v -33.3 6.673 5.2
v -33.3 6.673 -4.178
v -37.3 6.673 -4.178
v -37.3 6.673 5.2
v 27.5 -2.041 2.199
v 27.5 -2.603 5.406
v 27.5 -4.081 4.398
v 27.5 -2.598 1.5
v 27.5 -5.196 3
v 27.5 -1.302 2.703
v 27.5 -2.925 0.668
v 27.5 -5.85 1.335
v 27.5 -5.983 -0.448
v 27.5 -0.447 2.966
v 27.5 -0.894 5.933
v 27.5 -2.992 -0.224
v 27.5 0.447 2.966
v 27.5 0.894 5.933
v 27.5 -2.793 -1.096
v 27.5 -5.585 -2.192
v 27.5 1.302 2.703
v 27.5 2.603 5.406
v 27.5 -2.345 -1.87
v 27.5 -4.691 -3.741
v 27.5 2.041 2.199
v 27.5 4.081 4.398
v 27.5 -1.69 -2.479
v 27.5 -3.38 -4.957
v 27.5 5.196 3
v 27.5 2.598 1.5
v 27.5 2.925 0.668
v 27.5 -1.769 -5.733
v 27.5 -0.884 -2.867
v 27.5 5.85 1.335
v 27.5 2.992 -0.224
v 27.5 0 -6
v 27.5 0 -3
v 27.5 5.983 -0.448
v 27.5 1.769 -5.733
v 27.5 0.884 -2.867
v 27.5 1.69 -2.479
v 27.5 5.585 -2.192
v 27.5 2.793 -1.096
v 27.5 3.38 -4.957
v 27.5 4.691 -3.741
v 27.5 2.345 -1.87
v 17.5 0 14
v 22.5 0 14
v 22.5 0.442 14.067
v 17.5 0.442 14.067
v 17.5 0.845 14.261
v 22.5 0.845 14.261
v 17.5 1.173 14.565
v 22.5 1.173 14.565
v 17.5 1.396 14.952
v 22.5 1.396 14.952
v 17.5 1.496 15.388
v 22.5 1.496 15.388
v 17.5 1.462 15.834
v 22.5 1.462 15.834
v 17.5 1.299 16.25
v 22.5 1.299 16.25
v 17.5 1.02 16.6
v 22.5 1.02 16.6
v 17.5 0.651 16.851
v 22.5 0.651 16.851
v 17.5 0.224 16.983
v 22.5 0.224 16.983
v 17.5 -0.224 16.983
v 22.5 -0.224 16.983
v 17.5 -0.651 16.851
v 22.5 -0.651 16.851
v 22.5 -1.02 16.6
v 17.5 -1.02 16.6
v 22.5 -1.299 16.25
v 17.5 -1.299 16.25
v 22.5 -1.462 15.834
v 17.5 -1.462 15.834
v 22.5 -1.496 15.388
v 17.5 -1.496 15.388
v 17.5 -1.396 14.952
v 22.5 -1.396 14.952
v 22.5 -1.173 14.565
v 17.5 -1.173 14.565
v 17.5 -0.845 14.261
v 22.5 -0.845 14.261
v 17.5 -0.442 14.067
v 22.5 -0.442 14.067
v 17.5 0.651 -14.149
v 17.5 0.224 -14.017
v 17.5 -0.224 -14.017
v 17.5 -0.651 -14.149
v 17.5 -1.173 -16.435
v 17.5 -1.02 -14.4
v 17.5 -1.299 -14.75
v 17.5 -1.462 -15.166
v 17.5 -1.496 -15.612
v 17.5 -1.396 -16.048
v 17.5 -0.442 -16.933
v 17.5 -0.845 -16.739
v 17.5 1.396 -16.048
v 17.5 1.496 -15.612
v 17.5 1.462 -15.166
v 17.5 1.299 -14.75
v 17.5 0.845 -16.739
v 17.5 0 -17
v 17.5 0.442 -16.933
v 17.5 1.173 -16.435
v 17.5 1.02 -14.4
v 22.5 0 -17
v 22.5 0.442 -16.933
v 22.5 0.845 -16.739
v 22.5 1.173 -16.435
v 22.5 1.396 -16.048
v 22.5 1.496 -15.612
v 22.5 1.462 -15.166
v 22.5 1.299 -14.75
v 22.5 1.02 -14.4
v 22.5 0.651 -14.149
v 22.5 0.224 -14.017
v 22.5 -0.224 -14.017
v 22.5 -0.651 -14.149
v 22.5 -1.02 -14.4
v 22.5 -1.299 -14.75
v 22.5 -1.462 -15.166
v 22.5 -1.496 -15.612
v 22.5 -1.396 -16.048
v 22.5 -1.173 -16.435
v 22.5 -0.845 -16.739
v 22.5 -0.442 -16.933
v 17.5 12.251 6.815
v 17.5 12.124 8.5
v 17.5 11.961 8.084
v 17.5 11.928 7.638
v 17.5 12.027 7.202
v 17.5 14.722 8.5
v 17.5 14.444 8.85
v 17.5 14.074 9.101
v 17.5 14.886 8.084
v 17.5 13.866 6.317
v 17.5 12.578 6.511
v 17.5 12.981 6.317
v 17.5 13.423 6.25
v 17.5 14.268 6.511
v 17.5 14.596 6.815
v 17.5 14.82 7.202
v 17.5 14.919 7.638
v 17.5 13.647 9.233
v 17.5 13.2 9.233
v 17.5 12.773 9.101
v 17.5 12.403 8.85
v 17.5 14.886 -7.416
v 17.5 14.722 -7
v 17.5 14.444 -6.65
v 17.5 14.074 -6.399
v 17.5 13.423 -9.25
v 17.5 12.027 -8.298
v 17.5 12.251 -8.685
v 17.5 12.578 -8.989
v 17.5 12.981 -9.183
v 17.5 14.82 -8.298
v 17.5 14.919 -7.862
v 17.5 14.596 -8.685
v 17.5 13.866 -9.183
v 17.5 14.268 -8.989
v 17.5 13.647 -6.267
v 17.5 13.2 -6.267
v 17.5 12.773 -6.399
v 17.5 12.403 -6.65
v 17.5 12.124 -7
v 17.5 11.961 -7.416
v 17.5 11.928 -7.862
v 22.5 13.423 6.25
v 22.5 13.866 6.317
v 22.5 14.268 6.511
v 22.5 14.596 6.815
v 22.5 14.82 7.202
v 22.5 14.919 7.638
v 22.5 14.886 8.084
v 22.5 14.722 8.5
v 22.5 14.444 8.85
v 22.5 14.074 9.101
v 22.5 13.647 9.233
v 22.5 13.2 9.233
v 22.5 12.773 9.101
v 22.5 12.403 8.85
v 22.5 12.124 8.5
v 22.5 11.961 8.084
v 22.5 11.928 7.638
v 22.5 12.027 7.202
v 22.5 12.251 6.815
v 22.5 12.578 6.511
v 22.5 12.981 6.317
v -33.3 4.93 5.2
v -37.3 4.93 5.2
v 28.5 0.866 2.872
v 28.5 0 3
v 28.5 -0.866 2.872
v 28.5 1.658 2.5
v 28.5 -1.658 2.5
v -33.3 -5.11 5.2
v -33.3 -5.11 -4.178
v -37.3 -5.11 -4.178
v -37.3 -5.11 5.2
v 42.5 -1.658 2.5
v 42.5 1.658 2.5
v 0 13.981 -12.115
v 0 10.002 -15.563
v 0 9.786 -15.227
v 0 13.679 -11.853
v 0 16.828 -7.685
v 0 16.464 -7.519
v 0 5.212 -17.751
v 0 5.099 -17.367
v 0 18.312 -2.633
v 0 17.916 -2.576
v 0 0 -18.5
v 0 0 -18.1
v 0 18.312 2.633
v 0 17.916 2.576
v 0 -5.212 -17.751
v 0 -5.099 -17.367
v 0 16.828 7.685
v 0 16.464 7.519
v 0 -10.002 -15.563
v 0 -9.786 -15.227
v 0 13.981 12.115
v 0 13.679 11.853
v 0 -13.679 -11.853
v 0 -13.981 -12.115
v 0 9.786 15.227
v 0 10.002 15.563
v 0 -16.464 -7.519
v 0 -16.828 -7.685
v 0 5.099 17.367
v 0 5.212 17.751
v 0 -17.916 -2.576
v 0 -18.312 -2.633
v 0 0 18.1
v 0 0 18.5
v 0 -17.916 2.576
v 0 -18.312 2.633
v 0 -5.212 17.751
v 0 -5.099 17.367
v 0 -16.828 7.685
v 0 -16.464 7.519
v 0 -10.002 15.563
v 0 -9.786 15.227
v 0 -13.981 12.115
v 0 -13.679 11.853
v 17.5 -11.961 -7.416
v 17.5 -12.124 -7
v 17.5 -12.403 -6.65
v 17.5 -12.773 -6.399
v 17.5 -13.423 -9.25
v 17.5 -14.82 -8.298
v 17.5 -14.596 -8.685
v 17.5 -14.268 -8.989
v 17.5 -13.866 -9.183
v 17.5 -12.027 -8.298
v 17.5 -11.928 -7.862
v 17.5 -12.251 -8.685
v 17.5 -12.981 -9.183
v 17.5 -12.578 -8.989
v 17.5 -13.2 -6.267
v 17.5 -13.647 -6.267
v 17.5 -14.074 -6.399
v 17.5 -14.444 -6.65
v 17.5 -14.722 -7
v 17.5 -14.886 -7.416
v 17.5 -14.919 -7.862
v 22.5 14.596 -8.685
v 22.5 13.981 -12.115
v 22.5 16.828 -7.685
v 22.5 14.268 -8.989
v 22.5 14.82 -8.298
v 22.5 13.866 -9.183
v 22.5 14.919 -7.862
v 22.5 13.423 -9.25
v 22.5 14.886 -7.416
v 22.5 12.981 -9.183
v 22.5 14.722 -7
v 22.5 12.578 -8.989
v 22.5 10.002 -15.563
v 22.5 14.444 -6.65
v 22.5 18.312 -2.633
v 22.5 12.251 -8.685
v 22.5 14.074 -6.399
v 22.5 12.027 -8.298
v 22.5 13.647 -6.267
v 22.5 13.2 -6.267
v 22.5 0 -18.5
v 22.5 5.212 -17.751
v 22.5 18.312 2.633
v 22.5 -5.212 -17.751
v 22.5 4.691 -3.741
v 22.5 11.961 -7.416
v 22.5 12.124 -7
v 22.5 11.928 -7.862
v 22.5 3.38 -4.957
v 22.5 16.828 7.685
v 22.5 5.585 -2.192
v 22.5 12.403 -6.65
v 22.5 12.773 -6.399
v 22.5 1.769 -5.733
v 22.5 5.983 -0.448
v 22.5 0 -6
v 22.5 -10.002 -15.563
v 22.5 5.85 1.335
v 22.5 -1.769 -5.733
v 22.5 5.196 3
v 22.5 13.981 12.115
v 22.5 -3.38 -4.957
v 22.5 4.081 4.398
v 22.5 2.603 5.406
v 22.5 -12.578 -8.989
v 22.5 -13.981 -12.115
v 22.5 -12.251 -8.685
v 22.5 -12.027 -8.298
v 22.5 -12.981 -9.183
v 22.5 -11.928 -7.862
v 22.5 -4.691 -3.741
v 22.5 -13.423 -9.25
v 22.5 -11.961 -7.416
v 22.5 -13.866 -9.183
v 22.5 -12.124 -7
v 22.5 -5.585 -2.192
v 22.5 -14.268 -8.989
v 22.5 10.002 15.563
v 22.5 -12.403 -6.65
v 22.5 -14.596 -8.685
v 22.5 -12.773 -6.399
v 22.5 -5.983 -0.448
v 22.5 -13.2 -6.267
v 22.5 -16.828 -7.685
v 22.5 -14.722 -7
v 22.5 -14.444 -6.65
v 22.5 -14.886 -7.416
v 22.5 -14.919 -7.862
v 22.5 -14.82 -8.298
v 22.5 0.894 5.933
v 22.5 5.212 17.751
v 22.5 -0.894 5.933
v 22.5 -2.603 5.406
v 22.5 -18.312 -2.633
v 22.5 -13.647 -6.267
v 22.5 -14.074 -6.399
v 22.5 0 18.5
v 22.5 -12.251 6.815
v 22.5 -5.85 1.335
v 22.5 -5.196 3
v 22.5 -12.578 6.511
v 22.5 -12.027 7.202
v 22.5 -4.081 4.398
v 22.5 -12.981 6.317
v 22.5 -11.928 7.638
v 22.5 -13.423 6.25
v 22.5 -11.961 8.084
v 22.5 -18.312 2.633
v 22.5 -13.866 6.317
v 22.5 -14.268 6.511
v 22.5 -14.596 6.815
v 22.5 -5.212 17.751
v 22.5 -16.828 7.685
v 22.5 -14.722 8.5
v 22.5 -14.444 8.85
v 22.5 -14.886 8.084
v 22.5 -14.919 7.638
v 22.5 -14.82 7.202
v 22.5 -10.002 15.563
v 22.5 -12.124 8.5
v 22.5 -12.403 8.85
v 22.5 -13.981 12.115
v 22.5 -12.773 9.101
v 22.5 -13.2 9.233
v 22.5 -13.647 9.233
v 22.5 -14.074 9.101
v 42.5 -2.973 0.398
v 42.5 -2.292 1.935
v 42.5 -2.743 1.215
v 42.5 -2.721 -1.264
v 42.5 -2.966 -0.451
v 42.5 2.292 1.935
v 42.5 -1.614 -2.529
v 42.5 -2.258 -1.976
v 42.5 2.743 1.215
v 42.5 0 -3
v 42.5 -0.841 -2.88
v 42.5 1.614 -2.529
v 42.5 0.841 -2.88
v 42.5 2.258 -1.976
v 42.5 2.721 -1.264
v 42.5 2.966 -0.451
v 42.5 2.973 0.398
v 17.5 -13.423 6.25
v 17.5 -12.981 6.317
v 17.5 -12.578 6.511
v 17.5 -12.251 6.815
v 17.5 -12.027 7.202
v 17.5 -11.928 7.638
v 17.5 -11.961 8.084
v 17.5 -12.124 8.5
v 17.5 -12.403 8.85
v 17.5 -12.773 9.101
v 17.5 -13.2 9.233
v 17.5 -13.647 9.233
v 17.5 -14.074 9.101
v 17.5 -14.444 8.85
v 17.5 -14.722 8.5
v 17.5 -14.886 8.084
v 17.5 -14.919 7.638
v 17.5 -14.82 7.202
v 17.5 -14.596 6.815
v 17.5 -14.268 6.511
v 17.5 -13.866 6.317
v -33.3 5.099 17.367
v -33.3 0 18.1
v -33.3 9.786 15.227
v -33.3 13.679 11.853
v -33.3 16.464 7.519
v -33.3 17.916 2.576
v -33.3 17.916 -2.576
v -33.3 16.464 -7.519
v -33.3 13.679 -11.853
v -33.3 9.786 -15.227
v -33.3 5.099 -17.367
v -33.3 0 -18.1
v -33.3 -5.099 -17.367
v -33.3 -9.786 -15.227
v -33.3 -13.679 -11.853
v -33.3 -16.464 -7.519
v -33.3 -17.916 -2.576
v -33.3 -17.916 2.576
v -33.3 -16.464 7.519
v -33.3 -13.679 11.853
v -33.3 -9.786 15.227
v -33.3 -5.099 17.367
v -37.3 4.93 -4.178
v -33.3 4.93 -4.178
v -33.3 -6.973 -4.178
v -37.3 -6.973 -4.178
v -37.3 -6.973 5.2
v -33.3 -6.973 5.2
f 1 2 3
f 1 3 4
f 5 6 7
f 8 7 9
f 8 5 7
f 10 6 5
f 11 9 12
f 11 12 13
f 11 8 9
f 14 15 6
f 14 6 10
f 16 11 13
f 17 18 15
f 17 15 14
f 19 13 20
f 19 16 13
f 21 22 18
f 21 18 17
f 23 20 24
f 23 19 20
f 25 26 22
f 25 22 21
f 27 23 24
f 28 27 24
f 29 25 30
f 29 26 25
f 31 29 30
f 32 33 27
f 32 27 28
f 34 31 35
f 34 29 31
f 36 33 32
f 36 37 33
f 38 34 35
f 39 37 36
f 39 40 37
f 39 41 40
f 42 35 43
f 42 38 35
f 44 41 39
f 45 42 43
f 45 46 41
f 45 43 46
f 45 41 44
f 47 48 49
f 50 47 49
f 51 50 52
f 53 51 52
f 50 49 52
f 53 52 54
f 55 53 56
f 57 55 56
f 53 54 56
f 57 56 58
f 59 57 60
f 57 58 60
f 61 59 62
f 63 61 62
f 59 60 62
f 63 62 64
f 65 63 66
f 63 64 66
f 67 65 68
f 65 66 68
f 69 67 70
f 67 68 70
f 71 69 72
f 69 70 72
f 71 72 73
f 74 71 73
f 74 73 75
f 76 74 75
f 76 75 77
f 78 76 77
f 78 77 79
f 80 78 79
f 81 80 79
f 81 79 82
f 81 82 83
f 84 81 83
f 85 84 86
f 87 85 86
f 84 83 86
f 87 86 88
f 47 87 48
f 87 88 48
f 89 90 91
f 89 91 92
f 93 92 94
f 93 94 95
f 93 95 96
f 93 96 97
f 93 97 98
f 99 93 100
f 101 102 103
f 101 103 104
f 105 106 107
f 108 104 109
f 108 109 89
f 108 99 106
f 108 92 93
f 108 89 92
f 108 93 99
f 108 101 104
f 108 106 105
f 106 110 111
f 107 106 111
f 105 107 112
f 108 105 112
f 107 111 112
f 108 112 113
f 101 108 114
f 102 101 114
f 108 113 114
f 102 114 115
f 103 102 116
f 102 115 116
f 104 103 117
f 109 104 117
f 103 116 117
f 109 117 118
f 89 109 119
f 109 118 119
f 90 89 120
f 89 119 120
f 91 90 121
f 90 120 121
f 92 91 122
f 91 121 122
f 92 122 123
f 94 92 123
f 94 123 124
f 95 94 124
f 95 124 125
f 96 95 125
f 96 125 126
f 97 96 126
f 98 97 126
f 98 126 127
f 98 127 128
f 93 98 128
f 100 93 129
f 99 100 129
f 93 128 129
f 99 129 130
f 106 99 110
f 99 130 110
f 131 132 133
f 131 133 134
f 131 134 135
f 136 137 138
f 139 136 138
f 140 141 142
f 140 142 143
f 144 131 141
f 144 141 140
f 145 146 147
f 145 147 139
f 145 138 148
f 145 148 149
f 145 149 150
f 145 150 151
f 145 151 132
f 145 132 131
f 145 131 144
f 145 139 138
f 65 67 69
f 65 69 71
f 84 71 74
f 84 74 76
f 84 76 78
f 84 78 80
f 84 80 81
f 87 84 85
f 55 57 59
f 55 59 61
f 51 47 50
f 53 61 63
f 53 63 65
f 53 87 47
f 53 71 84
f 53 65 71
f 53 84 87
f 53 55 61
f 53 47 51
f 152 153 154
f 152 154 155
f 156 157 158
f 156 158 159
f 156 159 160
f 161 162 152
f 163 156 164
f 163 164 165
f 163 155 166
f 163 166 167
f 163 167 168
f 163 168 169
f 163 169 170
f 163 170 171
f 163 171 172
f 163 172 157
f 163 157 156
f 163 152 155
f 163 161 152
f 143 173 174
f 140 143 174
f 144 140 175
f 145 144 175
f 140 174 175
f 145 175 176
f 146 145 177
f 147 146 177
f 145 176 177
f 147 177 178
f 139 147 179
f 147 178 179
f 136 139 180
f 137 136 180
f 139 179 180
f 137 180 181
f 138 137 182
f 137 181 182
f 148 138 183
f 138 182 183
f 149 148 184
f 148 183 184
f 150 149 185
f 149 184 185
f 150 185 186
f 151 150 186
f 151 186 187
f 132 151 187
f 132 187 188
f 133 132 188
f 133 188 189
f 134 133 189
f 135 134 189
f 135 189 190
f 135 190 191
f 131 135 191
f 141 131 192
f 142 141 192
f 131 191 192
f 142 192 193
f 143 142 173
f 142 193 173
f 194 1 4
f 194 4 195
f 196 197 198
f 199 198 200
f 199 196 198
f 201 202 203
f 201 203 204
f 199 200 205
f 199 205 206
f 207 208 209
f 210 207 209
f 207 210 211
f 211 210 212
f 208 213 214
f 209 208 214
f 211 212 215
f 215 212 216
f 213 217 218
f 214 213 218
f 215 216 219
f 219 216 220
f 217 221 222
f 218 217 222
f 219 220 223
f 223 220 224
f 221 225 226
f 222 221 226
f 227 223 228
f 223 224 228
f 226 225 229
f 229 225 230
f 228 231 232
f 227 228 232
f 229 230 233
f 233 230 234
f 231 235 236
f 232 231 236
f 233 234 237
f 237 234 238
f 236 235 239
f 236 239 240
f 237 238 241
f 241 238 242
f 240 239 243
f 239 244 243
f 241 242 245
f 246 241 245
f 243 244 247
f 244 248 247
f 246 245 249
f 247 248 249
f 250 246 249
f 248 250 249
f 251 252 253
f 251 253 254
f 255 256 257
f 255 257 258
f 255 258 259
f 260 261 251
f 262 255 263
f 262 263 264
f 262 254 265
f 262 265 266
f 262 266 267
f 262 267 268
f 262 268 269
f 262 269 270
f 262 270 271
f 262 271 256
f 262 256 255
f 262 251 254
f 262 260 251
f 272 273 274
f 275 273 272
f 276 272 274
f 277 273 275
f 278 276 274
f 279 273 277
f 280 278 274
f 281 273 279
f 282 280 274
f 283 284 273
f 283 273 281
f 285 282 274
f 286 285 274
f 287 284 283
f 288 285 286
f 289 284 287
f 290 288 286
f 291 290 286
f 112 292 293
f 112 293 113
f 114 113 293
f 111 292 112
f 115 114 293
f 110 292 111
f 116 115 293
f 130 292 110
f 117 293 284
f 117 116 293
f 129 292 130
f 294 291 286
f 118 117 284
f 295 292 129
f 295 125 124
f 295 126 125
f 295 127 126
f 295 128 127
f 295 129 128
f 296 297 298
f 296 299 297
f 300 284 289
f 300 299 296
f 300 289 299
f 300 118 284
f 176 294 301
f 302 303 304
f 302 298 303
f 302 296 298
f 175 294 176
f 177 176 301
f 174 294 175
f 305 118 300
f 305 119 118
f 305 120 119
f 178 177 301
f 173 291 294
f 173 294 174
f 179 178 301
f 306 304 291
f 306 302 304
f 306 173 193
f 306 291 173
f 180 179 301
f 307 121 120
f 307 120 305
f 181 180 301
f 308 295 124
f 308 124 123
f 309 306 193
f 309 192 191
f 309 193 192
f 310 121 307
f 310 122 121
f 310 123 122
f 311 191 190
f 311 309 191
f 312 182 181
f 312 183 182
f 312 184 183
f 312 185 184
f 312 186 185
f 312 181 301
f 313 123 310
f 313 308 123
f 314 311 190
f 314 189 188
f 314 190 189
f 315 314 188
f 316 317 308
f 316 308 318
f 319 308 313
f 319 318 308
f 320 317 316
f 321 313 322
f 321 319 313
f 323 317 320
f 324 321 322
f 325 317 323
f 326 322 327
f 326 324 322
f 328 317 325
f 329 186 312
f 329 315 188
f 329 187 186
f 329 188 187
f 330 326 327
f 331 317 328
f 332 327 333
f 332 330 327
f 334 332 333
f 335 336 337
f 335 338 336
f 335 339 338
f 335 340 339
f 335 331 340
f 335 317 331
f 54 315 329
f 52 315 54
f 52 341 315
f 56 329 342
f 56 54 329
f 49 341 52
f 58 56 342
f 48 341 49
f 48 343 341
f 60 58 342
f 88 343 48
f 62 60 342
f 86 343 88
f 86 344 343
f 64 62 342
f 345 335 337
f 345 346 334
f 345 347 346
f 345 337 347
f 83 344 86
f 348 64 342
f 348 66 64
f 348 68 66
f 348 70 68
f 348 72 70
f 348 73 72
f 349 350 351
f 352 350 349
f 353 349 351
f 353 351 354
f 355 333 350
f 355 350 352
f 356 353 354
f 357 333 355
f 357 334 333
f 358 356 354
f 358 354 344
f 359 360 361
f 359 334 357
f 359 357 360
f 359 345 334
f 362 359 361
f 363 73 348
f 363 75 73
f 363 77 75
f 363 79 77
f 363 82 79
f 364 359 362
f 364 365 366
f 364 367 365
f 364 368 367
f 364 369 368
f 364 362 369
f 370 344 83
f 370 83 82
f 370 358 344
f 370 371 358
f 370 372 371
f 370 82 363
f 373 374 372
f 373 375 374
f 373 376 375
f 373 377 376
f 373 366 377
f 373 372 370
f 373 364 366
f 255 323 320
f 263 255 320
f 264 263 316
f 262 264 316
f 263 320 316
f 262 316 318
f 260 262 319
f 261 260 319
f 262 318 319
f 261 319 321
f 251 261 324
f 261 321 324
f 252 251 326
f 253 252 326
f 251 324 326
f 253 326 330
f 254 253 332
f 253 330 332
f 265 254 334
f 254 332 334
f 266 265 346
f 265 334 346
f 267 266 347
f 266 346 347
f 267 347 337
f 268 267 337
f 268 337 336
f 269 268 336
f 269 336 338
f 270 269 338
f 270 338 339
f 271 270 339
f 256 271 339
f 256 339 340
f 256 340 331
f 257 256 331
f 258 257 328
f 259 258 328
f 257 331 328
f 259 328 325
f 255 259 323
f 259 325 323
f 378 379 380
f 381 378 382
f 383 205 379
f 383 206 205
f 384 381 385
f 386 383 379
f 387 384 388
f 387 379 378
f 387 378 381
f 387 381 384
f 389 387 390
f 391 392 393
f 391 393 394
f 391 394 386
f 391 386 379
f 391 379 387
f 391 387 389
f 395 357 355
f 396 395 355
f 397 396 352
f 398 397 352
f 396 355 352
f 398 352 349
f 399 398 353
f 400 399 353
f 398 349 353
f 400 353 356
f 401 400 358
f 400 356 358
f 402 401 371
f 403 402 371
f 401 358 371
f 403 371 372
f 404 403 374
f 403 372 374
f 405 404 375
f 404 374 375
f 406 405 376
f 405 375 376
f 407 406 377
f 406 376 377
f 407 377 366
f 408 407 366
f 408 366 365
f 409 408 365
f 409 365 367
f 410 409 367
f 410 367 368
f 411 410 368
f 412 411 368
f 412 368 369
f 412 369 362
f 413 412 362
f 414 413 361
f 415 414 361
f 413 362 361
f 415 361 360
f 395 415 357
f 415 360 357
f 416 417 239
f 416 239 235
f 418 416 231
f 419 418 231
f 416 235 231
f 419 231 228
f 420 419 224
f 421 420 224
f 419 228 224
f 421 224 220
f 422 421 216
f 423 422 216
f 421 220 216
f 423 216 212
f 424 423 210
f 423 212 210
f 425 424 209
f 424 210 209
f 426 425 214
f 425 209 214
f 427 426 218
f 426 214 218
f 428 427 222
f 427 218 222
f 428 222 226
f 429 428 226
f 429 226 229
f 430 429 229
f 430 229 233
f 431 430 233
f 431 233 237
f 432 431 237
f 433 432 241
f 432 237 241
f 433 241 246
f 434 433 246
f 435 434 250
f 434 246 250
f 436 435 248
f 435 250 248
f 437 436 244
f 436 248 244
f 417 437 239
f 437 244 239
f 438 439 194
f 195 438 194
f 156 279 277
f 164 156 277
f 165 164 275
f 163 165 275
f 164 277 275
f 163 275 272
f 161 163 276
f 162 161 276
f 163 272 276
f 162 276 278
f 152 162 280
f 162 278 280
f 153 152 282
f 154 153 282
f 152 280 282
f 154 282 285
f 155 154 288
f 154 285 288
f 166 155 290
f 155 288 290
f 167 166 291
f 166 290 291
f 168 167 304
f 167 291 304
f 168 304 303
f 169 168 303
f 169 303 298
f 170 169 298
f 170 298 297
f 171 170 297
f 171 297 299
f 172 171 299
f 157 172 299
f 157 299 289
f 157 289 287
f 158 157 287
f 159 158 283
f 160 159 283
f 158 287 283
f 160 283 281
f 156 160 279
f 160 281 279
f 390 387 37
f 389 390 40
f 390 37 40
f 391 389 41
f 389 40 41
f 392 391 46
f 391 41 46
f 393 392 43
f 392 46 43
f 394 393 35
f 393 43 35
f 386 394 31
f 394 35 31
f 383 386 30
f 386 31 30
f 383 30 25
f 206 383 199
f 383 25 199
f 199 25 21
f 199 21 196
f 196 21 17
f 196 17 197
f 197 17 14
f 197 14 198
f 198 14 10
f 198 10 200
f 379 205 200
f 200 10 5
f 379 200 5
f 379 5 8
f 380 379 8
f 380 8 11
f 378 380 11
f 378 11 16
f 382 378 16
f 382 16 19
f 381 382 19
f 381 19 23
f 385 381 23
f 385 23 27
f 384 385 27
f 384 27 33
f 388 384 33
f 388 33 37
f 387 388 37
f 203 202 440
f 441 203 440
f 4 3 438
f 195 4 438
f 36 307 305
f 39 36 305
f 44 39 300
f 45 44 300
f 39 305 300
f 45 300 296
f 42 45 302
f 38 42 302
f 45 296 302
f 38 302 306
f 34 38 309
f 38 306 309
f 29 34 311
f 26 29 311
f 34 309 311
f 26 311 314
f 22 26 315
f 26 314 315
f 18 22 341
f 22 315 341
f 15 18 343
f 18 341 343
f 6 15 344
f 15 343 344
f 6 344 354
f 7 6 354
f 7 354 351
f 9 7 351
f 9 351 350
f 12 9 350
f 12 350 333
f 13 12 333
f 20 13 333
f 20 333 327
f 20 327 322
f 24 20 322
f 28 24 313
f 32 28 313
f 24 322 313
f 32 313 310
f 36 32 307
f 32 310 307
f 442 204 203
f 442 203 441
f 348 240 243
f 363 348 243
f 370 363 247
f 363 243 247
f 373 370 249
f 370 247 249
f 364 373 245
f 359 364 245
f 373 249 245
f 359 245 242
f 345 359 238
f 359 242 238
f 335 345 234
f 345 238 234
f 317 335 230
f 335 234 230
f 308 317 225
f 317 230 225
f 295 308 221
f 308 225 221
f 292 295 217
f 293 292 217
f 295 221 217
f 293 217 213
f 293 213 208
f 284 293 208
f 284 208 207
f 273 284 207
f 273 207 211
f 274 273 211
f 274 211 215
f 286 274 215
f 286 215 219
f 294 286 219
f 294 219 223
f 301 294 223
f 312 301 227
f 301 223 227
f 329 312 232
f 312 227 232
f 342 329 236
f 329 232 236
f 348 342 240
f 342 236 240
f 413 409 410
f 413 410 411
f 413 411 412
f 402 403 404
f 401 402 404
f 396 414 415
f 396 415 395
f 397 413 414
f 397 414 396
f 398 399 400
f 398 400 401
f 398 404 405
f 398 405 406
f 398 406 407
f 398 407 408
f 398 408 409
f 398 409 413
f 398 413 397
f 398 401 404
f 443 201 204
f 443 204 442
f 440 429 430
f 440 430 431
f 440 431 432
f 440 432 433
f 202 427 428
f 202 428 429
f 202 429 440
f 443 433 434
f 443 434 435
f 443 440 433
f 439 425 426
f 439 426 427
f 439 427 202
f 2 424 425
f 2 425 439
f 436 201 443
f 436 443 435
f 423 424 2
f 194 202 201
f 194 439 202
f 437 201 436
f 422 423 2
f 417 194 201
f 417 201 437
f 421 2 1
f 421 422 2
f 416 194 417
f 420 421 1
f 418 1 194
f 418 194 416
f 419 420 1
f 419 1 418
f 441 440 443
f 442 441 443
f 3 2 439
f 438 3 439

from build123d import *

# Parameters (mm, degrees)
SKETCH1_R               = 18.5
BOSS_EXTRUDE1_DEPTH     = 22.5
SKETCH2_R               = 6
BOSS_EXTRUDE2_DEPTH     = 5
SKETCH3_R               = 3
BOSS_EXTRUDE3_DEPTH     = 15
CUT_EXTRUDE1_DEPTH      = 50.907414279
CUT_EXTRUDE1_DEPTH_BACK = 14
SKETCH5_R               = 18.1
BOSS_EXTRUDE4_DEPTH     = 33.3
SKETCH6_W               = 1.743362505
SKETCH6_H               = 9.378087958
SKETCH6_W_2             = 1.863594402
BOSS_EXTRUDE5_DEPTH     = 4
SKETCH7_R               = 1.5
CUT_EXTRUDE2_DEPTH      = 5


with BuildPart() as part:
    # Sketch1 → Boss-Extrude1 (new body)
    with BuildSketch(Plane.YZ):
        with Locations(Location((0, 0, 0), (0, 0, 90))):
            Circle(SKETCH1_R)
    extrude(amount=BOSS_EXTRUDE1_DEPTH)

    # Sketch2 → Boss-Extrude2 (add)
    with BuildSketch(Plane.YZ.offset(22.5)):
        with Locations(Location((0, 0, 0), (0, 0, 270))):
            Circle(SKETCH2_R)
    extrude(amount=BOSS_EXTRUDE2_DEPTH)

    # Sketch3 → Boss-Extrude3 (add)
    with BuildSketch(Plane.YZ.offset(27.5)):
        with Locations(Location((0, 0, 0), (0, 0, 270))):
            Circle(SKETCH3_R)
    extrude(amount=BOSS_EXTRUDE3_DEPTH)

    # Sketch4 → Cut-Extrude1 (cut, two sides: drawn at the far end of the back side and taken through both)
    with BuildSketch(Plane.YZ.offset(42.5).offset(-CUT_EXTRUDE1_DEPTH_BACK)):
        Polygon((-69.877125802, 2.5), (-1.658312395, 2.5), (1.658312395, 2.5), (69.877125802, 2.5), (69.877125802, 138.937626813), (-69.877125802, 138.937626813), align=None)
    extrude(amount=CUT_EXTRUDE1_DEPTH + CUT_EXTRUDE1_DEPTH_BACK, mode=Mode.SUBTRACT)

    # Sketch5 → Boss-Extrude4 (add)
    with BuildSketch(Plane(origin=(0, 0, 0), x_dir=(0, -1, 0), z_dir=(-1, 0, 0))):
        with Locations(Location((0, 0, 0), (0, 0, 90))):
            Circle(SKETCH5_R)
    extrude(amount=BOSS_EXTRUDE4_DEPTH)

    # Sketch6 → Boss-Extrude5 (add)
    with BuildSketch(Plane(origin=(-33.3, 0, 0), x_dir=(0, -1, 0), z_dir=(-1, 0, 0))):
        with Locations((-5.801189026, 0.510985562)):
            Rectangle(SKETCH6_W, SKETCH6_H)
        with Locations((6.041652819, 0.510985562)):
            Rectangle(SKETCH6_W_2, SKETCH6_H)
    extrude(amount=BOSS_EXTRUDE5_DEPTH)

    # Sketch7 → Cut-Extrude2 (cut)
    with BuildSketch(Plane.YZ.offset(22.5)):
        with Locations(Location((0, 15.5, 0), (0, 0, 270))):
            Circle(SKETCH7_R)
        with Locations(Location((13.423393759, 7.75, 0), (0, 0, 270))):
            Circle(SKETCH7_R)
        with Locations(Location((13.423393759, -7.75, 0), (0, 0, 270))):
            Circle(SKETCH7_R)
        with Locations(Location((0, -15.5, 0), (0, 0, 270))):
            Circle(SKETCH7_R)
        with Locations(Location((-13.423393759, -7.75, 0), (0, 0, 270))):
            Circle(SKETCH7_R)
        with Locations(Location((-13.423393759, 7.75, 0), (0, 0, 270))):
            Circle(SKETCH7_R)
    extrude(amount=-CUT_EXTRUDE2_DEPTH, mode=Mode.SUBTRACT)


solid = part.part
